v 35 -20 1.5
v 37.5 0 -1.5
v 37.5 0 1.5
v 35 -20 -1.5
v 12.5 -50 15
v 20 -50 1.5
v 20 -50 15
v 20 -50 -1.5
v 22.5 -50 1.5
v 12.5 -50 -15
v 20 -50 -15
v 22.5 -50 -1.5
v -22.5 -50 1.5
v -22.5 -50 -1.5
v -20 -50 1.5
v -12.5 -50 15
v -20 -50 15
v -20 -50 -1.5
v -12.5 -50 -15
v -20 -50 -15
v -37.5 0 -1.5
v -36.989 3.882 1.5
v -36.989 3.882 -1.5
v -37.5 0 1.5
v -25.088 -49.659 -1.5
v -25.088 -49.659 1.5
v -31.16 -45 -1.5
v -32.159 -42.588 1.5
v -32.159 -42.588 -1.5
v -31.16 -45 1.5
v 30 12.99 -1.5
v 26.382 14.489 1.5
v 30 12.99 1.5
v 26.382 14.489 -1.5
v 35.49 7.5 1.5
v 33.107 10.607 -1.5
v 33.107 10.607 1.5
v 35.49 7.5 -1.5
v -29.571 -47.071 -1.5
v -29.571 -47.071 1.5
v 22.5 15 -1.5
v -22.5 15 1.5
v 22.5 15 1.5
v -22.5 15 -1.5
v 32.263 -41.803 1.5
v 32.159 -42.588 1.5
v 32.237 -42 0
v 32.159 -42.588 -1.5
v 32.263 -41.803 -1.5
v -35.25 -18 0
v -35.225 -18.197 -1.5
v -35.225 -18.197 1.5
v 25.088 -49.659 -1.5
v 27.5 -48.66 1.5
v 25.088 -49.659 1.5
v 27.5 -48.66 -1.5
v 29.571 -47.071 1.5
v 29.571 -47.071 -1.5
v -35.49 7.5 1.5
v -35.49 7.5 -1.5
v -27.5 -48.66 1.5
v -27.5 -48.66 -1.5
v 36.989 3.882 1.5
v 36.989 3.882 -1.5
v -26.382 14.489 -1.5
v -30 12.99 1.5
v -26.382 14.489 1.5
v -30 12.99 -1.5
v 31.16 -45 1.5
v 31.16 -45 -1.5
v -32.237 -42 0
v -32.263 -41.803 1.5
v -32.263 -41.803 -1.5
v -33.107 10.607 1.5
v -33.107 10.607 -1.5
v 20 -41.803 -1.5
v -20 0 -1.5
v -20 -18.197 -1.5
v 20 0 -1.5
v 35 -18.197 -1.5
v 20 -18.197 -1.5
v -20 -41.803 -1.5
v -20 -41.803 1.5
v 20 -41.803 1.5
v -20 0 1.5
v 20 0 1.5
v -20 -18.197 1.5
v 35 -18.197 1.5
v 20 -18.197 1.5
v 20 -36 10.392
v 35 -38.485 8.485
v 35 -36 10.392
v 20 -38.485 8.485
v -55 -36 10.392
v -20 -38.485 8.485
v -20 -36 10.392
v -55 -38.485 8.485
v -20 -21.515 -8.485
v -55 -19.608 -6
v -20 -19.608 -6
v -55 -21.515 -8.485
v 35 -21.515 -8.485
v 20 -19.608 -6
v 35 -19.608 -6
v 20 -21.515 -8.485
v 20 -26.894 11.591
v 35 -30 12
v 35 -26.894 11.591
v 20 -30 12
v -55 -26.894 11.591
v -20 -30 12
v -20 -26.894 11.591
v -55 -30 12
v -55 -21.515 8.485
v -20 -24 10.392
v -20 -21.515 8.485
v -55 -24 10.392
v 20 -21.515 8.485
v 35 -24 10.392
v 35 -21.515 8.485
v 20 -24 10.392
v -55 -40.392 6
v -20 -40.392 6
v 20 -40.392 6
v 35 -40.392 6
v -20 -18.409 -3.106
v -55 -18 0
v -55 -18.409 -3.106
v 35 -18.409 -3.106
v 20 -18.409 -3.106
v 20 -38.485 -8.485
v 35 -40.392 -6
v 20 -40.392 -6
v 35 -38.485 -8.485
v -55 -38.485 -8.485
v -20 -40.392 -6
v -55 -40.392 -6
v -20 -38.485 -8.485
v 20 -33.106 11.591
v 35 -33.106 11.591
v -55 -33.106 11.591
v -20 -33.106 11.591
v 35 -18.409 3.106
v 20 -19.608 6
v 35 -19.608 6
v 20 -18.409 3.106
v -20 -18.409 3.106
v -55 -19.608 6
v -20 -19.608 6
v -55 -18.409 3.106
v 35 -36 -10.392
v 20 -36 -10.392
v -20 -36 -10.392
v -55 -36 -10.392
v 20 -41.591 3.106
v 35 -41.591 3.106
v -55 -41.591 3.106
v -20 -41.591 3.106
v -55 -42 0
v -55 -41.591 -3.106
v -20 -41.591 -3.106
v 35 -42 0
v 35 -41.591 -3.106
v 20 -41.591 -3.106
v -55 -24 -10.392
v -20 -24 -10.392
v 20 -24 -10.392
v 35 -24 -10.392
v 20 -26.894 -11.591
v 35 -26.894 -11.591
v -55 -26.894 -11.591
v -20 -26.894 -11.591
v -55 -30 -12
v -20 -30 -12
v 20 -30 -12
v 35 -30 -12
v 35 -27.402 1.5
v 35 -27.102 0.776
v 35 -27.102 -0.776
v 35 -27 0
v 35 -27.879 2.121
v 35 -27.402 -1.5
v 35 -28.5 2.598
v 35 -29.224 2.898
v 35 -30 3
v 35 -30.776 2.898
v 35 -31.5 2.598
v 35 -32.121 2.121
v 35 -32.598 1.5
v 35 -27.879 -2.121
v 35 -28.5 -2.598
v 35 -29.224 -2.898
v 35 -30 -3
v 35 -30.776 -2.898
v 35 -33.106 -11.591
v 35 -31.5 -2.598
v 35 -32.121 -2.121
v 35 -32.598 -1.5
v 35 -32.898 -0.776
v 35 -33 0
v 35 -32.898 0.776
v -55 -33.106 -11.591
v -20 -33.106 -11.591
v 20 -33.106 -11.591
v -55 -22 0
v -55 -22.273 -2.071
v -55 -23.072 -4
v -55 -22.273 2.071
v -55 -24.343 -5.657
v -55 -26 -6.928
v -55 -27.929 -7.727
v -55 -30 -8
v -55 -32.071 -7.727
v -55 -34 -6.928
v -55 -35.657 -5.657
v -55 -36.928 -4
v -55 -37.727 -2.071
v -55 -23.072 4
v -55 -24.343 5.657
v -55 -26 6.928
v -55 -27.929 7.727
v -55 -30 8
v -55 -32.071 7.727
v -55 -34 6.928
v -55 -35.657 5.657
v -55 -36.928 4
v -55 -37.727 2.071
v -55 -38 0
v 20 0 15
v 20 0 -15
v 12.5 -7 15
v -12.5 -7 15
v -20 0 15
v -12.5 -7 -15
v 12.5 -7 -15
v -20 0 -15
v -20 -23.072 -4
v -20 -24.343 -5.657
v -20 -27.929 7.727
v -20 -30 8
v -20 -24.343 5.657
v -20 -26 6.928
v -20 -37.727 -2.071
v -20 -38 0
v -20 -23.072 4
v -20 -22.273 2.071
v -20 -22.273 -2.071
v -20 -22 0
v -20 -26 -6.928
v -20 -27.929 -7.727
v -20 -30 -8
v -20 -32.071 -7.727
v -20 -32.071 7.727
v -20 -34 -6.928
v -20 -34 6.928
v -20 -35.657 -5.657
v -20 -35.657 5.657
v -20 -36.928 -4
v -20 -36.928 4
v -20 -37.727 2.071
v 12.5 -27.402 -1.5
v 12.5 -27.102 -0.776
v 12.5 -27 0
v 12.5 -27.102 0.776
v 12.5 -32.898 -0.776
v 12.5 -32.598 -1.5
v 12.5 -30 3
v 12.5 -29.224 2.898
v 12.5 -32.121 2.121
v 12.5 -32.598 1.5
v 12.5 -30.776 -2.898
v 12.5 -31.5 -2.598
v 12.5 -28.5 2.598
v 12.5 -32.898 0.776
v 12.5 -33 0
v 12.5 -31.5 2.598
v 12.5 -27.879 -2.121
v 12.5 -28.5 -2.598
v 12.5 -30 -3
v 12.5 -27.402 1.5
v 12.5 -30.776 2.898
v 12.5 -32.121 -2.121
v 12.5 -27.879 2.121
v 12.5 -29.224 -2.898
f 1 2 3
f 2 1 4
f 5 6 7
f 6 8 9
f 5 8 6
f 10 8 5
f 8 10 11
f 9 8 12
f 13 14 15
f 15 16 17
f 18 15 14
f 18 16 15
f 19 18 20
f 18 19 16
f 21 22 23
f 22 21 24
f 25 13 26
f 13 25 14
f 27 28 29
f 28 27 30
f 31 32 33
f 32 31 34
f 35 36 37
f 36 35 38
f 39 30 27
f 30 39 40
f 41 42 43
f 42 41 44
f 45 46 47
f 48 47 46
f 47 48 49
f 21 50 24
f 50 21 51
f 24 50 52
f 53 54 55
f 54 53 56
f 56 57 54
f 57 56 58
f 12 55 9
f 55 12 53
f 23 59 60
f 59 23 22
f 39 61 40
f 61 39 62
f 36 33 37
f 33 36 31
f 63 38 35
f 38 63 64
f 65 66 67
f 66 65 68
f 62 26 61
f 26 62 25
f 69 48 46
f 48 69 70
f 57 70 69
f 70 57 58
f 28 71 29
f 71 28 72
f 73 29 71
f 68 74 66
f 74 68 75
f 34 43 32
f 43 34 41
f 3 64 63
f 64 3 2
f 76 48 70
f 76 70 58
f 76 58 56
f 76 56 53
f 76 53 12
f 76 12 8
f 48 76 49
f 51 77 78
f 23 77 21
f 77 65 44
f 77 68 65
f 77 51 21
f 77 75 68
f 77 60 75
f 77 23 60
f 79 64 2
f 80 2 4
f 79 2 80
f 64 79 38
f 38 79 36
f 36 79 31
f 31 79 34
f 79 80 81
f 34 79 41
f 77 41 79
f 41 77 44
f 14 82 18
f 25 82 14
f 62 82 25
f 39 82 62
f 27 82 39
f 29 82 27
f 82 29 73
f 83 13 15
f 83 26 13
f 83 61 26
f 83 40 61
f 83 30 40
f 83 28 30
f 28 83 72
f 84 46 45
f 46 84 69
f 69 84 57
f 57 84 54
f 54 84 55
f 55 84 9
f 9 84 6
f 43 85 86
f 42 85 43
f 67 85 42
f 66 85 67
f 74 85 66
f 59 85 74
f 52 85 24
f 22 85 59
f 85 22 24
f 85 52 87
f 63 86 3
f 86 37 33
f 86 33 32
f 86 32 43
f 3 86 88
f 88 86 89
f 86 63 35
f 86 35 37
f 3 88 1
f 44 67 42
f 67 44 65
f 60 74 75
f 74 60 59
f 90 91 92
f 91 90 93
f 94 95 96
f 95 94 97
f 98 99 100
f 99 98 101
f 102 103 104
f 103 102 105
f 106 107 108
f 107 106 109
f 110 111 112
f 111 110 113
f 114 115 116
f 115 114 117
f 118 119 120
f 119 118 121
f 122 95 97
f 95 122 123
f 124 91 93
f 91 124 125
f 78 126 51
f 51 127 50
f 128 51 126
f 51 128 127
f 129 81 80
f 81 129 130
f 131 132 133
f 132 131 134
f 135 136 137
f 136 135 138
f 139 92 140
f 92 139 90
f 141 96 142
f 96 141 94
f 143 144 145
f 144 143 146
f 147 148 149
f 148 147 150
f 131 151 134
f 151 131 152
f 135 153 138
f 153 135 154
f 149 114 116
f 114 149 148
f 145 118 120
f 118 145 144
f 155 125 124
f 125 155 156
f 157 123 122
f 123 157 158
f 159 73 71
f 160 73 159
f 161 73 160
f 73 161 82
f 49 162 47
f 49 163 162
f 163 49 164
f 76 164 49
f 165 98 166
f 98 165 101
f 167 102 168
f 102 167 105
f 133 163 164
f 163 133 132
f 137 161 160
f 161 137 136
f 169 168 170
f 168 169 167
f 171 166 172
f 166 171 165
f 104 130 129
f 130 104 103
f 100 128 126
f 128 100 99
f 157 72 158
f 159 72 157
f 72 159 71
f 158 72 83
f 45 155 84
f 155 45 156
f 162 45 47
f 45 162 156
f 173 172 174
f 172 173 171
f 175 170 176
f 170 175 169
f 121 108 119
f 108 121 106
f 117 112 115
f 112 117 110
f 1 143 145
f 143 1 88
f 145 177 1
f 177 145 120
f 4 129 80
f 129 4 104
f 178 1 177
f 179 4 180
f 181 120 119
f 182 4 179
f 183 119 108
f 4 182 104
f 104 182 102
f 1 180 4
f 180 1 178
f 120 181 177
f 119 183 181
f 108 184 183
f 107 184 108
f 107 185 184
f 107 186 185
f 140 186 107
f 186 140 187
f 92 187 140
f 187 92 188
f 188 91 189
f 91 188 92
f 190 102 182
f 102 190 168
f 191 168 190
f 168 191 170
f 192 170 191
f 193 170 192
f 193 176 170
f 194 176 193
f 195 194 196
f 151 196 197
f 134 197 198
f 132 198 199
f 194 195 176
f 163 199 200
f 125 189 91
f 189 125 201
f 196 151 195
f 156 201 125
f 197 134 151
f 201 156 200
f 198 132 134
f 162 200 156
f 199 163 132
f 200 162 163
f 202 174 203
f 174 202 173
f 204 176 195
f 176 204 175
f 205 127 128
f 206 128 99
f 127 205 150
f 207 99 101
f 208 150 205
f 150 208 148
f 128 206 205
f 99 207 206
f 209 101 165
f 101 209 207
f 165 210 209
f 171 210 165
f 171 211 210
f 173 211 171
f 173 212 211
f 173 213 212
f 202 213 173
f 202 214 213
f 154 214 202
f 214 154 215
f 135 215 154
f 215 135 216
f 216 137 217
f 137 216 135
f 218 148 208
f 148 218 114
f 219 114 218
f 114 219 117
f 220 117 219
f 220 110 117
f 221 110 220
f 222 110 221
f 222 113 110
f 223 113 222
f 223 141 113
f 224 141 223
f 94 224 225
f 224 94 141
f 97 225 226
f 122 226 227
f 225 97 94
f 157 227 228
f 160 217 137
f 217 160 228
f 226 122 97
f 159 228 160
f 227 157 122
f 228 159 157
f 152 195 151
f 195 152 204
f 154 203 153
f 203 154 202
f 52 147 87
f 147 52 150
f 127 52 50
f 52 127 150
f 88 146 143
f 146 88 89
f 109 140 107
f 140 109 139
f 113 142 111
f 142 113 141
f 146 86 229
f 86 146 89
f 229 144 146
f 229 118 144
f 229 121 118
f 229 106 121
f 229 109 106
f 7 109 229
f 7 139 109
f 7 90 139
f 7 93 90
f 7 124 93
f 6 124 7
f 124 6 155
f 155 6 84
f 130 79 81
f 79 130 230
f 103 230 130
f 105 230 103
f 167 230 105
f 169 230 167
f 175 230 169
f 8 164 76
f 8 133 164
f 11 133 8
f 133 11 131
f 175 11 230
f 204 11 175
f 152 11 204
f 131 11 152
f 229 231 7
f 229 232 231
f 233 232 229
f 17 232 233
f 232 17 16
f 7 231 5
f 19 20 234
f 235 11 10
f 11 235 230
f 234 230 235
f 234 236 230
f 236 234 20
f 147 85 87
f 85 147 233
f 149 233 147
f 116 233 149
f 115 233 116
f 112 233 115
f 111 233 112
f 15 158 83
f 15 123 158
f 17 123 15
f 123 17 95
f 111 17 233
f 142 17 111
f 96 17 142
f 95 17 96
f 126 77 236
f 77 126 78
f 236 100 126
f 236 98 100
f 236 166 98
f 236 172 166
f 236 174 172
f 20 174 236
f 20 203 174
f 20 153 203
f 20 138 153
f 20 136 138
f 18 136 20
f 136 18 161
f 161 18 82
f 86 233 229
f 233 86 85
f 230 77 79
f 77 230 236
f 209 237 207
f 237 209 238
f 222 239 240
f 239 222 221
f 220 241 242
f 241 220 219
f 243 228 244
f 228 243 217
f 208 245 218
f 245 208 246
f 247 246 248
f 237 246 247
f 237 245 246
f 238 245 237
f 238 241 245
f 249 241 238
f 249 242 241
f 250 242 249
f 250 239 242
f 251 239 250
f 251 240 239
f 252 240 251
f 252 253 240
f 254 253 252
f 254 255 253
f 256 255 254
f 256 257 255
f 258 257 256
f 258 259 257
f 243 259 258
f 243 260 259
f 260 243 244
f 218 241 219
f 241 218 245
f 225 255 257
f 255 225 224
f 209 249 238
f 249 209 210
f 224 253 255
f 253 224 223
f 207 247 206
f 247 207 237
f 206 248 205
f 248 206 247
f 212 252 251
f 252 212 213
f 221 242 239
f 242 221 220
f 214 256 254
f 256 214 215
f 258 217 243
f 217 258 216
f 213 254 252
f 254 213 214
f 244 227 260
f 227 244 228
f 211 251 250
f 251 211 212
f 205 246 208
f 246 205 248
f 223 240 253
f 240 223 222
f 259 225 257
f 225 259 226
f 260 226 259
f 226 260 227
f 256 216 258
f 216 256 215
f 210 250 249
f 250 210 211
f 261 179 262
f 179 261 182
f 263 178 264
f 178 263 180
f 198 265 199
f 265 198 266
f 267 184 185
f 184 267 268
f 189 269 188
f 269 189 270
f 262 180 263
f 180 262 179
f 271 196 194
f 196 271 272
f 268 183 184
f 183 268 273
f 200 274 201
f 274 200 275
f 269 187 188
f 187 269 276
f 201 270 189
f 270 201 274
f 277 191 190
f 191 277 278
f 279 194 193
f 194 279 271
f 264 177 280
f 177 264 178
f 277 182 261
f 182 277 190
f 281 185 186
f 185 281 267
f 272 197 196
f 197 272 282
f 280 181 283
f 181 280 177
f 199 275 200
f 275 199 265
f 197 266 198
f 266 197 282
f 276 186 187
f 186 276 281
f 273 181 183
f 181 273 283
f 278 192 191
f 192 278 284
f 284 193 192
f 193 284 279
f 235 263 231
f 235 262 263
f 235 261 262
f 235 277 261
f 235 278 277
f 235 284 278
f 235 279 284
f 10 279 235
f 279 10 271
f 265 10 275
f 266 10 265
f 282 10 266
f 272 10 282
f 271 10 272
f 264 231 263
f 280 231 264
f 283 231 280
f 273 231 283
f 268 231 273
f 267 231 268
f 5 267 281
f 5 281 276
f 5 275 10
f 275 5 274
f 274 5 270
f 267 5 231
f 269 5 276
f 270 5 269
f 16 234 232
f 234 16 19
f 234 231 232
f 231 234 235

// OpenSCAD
difference(){
    union(){
hull(){
translate([22.5,0,0]) cylinder(3,15,15,center = true,$fn=24);
translate([-22.5,0,0]) cylinder(3,15,15,center = true,$fn=24);

translate([22.5,-40,0]) cylinder(3,10,10,center = true,$fn=24);
translate([-22.5,-40,0]) cylinder(3,10,10,center = true,$fn=24);
}


translate([-10,-30,0]) rotate([0,-90,0]) color("red") cylinder(90,12,12,center = true,$fn=24);

translate([0, -25,0]) color("green") cube([40,50,30],center = true);

}
translate([-45,-30,0]) rotate([0,-90,0]) color("green") cylinder(50,8,8,center = true,$fn=24);

translate([35,-30,0]) rotate([0,-90,0])color("blue") cylinder(50,3,3,center = true,$fn=24);

translate([0, -37,0]) color("yellow") cube([25,60,40],center = true);
}
